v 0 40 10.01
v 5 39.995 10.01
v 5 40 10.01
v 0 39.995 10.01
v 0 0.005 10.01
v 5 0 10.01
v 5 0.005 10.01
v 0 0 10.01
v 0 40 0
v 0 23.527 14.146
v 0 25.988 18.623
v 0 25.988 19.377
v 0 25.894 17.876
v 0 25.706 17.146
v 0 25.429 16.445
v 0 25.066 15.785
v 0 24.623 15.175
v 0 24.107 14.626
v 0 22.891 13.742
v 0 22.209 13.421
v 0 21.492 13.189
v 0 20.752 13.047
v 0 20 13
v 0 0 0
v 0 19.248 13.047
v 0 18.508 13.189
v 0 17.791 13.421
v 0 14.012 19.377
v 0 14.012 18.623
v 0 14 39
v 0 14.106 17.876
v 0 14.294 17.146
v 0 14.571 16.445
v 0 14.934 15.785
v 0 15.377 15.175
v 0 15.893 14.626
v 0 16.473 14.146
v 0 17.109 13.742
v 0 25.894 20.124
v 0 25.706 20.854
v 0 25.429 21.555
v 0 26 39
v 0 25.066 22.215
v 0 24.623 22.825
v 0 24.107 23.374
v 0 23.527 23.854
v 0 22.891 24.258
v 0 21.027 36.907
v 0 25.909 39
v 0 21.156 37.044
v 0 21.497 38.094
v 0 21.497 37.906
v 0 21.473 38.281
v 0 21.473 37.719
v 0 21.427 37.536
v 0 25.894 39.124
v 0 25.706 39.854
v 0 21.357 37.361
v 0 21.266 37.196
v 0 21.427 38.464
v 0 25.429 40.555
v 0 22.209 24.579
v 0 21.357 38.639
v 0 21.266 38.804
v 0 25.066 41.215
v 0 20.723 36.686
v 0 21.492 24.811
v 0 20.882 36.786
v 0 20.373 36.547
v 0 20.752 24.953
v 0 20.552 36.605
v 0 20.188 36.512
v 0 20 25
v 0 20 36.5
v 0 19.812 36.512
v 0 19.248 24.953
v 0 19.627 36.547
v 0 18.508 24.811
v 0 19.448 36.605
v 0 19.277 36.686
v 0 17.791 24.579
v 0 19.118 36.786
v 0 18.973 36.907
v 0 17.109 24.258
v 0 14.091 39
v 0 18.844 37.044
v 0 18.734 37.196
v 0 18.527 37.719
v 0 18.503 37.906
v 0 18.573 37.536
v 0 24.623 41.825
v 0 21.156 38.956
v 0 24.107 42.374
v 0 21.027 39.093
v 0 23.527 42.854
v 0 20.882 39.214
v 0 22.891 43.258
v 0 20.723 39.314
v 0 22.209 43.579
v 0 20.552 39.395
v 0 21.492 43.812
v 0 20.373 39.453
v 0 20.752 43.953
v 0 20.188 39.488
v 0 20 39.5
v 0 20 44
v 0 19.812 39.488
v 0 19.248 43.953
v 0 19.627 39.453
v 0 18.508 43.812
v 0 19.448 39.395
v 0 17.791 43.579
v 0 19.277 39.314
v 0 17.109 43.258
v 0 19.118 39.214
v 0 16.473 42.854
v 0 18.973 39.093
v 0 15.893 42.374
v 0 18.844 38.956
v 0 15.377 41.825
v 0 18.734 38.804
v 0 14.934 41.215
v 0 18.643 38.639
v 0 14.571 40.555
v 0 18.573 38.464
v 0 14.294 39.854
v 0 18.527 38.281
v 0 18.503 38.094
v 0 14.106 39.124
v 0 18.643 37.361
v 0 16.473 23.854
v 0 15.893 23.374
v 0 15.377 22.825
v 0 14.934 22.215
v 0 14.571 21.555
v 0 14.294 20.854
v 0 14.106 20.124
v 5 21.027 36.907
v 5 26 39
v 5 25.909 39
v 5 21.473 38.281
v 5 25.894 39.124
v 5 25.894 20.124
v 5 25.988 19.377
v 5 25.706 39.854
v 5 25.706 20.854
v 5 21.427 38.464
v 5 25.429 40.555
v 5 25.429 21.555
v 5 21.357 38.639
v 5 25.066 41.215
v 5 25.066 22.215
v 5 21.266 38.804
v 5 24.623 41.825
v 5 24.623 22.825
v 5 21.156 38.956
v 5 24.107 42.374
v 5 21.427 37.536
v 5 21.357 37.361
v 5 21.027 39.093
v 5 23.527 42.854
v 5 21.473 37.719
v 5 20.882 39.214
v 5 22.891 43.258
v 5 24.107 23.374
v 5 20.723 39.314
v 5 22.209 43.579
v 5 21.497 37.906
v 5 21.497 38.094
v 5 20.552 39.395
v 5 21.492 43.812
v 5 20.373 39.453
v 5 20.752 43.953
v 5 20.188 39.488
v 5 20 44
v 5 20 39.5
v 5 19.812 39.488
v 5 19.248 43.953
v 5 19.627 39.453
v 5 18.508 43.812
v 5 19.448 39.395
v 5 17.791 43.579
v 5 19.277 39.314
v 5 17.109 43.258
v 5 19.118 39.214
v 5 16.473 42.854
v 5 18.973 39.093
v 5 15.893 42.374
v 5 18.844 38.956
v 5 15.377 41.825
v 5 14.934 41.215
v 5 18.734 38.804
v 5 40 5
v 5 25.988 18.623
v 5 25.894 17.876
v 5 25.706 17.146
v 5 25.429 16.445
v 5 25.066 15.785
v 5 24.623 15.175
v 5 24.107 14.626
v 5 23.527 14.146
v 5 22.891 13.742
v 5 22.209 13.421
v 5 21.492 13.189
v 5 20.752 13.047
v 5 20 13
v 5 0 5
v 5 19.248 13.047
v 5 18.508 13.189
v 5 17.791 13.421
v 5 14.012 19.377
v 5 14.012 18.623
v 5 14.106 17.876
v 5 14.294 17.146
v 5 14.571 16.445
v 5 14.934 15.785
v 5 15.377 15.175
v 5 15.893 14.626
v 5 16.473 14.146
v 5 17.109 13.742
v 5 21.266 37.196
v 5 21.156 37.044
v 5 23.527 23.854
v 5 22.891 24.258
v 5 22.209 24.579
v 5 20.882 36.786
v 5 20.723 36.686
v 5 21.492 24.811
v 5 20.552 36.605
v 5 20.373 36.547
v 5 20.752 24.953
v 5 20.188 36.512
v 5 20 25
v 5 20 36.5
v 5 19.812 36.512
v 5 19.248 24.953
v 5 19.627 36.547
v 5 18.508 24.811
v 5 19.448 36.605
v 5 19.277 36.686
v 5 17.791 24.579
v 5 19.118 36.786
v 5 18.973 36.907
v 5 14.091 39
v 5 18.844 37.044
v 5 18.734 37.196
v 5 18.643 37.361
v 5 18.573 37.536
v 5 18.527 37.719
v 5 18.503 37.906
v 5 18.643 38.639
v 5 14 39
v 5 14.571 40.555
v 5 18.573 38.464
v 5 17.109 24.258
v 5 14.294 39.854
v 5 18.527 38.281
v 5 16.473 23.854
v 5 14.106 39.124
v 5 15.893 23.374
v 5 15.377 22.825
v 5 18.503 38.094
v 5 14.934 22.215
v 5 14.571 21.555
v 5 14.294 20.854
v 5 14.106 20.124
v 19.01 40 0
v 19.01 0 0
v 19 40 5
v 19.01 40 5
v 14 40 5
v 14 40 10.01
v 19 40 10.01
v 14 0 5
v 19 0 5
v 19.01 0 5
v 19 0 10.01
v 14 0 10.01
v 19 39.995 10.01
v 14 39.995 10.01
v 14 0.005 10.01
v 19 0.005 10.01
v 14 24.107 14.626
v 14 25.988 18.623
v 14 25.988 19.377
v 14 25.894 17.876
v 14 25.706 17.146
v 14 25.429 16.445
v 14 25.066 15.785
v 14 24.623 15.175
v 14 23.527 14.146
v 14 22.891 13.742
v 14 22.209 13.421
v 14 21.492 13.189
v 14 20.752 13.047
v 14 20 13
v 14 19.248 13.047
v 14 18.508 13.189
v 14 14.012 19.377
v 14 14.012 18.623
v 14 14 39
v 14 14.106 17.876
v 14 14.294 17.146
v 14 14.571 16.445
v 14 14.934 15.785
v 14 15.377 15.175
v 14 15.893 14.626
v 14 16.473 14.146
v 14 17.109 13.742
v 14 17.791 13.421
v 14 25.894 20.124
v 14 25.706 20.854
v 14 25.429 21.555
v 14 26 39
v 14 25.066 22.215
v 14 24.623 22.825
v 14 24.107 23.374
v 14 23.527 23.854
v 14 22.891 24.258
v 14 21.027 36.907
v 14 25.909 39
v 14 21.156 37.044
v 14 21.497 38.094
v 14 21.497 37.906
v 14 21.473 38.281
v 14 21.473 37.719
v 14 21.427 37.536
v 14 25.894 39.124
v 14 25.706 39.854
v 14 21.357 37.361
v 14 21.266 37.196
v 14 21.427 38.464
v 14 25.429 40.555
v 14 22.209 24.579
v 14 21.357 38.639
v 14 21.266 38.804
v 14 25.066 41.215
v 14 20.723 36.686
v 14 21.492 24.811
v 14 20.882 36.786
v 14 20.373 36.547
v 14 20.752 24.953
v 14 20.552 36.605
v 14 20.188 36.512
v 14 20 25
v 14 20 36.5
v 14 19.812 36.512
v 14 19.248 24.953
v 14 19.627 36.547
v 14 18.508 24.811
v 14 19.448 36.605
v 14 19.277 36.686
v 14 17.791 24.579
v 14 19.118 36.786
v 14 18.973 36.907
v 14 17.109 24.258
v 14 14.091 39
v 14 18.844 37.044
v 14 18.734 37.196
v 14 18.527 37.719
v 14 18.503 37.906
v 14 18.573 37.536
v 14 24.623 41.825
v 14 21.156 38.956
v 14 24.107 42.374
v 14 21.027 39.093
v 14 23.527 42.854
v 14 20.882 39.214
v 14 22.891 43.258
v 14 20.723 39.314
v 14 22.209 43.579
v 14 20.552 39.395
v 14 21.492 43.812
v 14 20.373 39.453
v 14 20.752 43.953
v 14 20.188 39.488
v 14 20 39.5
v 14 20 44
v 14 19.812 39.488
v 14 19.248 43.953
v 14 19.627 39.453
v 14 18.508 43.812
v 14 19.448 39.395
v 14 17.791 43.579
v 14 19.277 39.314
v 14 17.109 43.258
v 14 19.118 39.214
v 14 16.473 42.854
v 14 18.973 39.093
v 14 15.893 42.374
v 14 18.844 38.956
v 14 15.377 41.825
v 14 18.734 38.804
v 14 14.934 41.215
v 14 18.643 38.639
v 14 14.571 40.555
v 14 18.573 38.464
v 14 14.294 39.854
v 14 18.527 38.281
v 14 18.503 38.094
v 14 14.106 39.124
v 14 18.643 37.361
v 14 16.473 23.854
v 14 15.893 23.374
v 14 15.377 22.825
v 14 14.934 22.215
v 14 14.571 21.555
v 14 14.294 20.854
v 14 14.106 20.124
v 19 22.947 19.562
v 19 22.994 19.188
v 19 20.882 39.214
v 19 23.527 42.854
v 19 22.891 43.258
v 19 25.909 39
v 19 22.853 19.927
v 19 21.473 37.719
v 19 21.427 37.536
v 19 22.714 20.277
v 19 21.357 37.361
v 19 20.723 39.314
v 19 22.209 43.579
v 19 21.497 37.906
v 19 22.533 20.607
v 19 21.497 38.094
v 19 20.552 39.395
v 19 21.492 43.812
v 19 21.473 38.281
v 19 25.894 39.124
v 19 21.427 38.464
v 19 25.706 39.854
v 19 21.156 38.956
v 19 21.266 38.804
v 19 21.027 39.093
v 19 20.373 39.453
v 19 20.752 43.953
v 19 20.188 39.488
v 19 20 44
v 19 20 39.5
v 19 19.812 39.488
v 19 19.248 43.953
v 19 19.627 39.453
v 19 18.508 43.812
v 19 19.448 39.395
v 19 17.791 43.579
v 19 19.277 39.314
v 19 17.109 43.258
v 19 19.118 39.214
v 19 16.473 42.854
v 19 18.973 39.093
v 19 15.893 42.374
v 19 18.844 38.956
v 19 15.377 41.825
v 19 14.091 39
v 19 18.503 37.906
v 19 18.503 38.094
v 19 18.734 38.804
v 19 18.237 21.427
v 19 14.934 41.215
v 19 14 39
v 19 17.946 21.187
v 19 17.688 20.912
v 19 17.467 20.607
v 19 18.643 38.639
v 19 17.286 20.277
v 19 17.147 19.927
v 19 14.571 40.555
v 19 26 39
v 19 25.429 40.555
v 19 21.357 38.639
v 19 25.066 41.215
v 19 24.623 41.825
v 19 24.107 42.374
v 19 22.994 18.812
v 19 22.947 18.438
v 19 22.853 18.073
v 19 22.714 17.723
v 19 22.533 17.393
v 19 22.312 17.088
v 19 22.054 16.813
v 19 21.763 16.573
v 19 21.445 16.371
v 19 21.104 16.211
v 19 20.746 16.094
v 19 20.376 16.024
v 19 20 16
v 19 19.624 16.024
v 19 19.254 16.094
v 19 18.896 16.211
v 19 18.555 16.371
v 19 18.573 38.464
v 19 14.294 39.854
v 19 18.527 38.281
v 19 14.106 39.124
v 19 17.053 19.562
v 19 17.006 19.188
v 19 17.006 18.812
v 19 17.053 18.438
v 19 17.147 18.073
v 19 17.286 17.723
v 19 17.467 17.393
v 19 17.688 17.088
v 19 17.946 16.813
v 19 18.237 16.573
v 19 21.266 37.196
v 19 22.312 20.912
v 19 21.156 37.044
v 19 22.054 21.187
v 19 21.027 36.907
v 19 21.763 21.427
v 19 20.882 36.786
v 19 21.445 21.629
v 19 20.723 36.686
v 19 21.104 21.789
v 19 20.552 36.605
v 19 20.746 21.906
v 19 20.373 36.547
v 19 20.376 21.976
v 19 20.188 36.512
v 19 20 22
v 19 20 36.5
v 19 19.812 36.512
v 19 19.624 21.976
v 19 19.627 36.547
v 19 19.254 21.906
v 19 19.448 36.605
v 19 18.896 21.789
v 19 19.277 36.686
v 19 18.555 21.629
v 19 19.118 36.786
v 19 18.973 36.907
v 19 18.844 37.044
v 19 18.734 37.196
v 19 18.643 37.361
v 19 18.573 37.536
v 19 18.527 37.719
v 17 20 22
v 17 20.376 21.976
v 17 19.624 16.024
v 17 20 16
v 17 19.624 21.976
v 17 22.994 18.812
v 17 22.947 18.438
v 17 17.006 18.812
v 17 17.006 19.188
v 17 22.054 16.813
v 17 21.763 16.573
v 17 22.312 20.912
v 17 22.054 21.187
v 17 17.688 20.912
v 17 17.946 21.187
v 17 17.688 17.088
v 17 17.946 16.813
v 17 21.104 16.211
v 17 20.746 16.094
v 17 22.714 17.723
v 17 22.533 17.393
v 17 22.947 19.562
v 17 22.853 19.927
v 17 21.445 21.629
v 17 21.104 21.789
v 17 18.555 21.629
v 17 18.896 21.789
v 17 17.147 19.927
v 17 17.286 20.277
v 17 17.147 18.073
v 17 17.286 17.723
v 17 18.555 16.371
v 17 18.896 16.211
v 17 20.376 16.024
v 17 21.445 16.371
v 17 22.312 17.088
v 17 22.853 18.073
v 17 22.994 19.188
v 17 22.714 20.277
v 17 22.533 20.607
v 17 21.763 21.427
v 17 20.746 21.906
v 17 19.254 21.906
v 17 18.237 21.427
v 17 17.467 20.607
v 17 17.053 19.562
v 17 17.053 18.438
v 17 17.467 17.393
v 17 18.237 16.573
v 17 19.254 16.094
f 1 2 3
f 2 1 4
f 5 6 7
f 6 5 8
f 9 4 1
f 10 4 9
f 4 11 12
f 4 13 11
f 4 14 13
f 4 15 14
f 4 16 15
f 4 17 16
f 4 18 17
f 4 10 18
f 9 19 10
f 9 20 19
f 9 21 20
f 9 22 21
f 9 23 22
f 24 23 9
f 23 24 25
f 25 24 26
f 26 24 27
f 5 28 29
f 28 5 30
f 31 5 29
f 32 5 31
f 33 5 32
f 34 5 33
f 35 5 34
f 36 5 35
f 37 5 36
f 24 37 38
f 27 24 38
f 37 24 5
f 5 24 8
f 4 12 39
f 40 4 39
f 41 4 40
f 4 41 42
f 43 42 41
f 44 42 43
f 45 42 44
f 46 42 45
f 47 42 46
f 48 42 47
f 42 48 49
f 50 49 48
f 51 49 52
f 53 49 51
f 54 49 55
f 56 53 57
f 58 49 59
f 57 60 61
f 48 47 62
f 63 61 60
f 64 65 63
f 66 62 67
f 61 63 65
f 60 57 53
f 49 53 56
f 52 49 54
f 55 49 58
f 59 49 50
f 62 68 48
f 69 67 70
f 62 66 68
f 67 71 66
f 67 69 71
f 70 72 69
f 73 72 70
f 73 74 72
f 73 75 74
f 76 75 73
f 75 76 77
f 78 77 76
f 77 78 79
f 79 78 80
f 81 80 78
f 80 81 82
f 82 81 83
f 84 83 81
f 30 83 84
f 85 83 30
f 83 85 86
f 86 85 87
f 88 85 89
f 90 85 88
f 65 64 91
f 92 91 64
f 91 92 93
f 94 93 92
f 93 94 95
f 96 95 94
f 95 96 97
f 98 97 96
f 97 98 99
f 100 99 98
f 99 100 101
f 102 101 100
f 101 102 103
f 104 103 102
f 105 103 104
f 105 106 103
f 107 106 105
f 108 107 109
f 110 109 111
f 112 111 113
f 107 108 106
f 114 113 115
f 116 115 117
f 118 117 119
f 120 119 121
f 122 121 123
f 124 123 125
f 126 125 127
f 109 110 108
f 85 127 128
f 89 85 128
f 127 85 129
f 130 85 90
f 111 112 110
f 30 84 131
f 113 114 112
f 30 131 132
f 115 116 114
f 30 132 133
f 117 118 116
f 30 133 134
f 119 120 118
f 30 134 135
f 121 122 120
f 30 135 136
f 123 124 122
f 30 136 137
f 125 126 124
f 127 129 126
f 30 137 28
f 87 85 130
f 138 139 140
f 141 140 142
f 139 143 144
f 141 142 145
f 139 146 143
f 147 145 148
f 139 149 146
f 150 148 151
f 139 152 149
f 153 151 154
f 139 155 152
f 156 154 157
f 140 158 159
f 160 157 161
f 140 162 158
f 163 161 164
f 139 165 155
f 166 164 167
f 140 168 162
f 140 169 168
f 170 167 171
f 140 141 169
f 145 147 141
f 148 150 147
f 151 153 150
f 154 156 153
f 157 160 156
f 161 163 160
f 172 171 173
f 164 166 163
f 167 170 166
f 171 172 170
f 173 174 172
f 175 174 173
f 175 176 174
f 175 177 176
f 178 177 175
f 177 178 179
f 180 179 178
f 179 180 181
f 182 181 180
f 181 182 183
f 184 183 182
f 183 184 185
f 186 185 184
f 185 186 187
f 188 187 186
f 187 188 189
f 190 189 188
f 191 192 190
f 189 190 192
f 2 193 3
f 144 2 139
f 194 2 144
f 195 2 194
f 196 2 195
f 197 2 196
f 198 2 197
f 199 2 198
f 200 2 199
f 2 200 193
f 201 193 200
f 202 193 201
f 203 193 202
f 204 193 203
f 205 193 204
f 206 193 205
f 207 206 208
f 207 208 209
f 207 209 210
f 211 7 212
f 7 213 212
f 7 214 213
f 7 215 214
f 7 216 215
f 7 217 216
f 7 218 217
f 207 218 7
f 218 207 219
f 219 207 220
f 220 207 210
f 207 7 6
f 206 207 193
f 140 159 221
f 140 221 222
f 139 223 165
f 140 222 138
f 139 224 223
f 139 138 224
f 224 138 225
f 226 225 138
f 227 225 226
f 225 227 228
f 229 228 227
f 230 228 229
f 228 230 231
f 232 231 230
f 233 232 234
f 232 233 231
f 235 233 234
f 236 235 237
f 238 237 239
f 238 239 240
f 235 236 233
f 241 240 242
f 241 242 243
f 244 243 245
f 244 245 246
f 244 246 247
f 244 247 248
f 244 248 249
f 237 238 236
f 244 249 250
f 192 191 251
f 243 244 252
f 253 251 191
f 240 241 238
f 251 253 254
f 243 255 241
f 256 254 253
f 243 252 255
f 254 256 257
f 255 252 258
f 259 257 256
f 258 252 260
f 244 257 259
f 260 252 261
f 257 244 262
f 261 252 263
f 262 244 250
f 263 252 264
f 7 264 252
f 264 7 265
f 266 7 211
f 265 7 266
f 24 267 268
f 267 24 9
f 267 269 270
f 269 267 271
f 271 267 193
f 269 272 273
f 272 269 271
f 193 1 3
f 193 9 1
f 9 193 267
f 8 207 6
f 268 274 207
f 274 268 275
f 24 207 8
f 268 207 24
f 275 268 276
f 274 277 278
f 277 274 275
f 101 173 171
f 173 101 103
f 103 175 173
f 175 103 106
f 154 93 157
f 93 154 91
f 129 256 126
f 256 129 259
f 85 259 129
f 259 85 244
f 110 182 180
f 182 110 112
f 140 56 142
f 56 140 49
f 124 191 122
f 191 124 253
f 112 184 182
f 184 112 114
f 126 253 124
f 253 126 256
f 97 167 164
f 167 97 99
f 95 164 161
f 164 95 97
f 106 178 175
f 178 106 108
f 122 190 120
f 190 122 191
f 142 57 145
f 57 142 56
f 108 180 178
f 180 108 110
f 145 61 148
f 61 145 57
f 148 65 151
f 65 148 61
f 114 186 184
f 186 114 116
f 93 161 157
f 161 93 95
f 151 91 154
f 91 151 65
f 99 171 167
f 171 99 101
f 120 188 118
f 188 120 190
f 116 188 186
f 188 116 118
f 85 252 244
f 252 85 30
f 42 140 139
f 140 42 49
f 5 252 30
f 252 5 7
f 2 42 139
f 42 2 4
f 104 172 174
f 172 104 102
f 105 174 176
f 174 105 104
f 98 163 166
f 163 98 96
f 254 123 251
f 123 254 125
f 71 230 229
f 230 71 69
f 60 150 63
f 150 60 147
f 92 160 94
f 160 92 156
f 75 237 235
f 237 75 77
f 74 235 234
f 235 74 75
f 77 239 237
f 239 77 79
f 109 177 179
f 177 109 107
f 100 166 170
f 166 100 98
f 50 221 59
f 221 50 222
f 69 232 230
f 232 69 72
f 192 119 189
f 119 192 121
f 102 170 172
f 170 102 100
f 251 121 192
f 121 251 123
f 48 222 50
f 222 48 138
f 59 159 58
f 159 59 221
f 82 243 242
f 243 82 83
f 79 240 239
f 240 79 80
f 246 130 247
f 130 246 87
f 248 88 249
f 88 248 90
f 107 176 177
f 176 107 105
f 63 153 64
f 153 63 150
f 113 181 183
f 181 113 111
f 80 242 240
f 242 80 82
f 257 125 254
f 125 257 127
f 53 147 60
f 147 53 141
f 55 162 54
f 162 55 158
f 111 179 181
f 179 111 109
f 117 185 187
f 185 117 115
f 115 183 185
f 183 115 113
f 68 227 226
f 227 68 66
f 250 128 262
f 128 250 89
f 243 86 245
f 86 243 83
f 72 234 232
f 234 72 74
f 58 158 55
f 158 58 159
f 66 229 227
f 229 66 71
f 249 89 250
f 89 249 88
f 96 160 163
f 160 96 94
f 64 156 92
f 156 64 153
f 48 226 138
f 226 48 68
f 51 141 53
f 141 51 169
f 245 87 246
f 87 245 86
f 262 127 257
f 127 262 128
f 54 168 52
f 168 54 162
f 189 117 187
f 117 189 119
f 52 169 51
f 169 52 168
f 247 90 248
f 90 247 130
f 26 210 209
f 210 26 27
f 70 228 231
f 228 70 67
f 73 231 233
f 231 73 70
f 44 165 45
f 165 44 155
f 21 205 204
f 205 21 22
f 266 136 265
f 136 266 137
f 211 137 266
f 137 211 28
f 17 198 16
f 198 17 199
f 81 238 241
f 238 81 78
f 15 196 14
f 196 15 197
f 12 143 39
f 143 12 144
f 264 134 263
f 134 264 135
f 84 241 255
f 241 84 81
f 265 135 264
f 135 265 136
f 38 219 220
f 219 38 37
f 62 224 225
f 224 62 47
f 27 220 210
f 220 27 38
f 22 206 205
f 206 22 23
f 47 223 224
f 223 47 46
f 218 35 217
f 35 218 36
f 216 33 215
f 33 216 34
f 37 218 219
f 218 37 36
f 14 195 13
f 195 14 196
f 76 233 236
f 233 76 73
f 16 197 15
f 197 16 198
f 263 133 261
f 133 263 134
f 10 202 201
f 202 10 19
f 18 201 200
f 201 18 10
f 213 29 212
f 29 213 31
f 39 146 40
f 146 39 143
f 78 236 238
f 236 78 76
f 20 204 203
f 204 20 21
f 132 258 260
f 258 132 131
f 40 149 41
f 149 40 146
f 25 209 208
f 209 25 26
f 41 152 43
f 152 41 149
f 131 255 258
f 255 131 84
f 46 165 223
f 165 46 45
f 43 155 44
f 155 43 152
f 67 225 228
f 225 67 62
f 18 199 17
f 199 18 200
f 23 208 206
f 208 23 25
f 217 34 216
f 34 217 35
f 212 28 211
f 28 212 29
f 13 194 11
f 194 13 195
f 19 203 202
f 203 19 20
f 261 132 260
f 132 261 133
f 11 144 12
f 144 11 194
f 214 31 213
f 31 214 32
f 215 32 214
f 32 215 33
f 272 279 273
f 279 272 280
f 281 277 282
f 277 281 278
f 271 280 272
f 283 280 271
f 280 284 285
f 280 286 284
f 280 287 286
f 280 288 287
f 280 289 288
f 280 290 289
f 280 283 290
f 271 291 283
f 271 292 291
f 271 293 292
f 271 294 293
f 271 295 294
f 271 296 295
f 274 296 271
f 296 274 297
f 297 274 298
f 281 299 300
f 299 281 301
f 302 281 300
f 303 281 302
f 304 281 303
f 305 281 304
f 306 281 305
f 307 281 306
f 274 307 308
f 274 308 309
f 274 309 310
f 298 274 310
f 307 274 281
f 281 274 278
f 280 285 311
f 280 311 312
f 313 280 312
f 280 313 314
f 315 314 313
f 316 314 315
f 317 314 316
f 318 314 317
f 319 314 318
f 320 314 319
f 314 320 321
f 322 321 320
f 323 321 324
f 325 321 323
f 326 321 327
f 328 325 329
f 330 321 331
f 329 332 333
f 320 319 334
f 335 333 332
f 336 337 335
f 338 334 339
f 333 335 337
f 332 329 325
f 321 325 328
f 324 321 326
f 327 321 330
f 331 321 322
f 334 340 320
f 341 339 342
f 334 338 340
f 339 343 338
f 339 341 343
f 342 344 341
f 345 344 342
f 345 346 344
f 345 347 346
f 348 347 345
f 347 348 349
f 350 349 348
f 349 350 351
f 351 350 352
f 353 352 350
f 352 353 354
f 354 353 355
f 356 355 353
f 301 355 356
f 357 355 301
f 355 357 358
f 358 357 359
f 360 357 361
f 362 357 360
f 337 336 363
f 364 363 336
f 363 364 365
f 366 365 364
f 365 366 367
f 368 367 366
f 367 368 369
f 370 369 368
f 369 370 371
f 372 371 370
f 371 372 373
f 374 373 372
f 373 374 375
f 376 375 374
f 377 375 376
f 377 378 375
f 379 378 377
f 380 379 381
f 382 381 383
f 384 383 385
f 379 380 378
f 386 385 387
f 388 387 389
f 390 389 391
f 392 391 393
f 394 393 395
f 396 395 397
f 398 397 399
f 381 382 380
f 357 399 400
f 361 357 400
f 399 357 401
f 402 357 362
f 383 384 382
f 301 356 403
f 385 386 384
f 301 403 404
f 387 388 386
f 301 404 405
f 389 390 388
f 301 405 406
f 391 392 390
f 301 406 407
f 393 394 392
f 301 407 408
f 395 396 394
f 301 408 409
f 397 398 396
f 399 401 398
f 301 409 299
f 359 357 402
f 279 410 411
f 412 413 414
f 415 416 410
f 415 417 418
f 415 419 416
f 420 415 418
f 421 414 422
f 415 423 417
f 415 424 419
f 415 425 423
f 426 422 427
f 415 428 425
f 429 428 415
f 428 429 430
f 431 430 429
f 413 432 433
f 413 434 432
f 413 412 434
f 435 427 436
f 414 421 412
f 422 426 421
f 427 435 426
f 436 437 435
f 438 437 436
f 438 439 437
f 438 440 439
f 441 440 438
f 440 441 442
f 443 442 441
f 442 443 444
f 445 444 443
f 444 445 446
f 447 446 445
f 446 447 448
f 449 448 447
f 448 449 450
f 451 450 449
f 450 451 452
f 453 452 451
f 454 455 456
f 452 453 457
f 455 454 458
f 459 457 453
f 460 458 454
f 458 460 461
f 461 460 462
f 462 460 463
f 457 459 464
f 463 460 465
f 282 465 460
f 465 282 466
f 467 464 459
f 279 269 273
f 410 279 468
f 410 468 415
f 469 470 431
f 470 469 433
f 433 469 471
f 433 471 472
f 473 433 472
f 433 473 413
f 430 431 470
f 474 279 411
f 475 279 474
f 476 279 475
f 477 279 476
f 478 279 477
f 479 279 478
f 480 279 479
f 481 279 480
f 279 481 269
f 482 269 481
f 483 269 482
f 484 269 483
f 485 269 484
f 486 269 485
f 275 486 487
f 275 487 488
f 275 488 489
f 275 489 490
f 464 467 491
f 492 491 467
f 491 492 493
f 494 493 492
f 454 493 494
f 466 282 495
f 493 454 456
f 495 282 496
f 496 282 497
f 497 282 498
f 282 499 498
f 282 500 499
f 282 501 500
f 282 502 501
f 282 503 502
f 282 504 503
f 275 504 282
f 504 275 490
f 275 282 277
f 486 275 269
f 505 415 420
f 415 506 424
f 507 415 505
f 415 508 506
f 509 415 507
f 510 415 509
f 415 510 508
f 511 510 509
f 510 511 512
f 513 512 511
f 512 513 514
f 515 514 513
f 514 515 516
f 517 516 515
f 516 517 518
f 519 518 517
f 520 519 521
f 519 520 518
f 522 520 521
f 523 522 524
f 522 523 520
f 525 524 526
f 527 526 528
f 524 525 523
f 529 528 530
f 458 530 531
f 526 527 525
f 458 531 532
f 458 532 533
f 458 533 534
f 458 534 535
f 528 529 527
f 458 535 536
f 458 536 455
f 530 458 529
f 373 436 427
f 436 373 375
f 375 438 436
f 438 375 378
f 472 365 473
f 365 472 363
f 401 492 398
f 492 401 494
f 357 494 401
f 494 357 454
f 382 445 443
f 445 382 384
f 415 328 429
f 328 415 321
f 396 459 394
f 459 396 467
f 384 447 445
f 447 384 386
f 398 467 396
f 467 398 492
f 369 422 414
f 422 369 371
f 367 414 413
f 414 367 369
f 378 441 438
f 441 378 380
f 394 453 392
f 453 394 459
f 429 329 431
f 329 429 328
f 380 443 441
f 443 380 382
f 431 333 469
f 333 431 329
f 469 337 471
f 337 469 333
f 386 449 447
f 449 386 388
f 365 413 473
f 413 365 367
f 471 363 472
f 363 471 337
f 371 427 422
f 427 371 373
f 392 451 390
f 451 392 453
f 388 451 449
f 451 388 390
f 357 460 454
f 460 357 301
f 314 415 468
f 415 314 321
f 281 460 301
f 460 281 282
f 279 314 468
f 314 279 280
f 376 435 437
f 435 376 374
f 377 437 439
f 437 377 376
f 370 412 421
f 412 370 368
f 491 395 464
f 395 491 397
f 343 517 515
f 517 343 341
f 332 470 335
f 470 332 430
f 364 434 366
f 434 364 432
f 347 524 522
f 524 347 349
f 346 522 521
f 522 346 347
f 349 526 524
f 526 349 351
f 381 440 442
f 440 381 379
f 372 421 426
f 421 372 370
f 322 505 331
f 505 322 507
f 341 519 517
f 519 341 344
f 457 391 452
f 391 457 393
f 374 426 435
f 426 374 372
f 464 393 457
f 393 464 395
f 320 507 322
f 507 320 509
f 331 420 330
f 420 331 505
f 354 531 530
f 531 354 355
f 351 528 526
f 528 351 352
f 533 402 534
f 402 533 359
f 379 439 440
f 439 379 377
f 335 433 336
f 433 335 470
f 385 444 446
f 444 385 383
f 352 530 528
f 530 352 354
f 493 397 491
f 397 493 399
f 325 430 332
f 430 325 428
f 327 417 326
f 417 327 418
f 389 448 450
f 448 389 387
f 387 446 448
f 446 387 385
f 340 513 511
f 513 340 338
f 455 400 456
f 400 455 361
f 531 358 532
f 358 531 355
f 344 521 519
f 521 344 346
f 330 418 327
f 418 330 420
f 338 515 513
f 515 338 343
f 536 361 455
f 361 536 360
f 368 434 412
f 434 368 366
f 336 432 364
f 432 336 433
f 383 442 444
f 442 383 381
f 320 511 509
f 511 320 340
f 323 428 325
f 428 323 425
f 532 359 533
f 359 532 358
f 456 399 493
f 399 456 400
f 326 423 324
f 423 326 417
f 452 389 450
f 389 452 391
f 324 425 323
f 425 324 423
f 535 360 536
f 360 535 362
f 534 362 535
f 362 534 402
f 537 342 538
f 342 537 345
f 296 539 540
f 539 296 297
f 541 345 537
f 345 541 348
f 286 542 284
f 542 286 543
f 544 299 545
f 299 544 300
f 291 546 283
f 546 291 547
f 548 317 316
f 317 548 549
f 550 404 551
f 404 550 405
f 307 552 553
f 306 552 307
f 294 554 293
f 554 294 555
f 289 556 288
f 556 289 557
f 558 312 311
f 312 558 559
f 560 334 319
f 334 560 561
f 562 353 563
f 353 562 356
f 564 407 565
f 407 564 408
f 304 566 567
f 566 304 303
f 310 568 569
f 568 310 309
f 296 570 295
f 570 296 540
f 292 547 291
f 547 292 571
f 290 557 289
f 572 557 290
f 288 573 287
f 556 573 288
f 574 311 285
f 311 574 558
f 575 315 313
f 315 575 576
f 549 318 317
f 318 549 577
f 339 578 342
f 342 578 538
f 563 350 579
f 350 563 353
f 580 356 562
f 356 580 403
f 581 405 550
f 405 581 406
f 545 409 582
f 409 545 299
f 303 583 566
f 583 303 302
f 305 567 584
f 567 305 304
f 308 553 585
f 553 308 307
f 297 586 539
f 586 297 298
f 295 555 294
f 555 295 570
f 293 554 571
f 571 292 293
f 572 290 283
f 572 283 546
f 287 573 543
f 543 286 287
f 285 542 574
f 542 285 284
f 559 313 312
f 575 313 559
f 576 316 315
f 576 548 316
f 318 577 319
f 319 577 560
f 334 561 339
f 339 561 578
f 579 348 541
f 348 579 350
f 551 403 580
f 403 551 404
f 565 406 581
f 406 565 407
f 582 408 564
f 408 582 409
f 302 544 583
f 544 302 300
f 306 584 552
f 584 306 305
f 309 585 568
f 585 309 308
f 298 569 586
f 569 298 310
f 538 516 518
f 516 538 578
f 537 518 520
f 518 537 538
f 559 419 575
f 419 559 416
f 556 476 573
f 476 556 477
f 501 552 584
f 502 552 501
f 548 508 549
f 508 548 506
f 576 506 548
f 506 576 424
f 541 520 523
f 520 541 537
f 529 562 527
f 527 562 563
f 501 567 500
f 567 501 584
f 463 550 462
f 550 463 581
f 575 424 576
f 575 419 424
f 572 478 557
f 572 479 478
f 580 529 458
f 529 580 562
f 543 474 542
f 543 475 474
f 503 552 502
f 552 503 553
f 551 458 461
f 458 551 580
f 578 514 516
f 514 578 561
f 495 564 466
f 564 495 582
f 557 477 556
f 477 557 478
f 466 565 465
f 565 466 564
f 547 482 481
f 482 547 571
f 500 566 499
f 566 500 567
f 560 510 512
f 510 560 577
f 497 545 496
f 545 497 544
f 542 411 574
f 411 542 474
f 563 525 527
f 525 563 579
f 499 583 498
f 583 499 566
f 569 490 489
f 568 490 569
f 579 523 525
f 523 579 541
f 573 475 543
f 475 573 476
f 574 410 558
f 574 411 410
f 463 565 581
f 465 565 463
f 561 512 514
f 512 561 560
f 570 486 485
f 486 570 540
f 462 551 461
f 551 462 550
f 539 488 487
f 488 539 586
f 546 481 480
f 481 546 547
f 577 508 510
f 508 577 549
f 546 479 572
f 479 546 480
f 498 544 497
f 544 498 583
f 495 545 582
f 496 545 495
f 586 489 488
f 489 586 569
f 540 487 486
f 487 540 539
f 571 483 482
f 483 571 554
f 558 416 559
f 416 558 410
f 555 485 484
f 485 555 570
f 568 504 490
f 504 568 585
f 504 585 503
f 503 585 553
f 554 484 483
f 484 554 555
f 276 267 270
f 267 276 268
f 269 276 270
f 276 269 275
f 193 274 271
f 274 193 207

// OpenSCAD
$fn=50;

hc=5;
cil=34;
cil2=12;
le=40;
br=19;
br2=10;

union()
{    
    
    translate([0,0,0])
        cube([br+0.01,le,hc], center=false);

    translate([5,0,0])
    rotate([0,-90,0])
        difference()
        {    
            union()
            {
                translate([0,0,0])
                    cube([br2+0.01,le,hc], center=false);

                translate([38,le/2,2.5])
                    cylinder(h=hc,d=cil2,center=true);
                
                CubePoints = [
                  [br2,0,0 ],  //0
                  [39,(le-cil2)/2,0 ],  //1
                  [39,cil2+(le-cil2)/2,0 ],  //2
                  [br2,le,0 ],  //3
                  [br2,0,hc ],  //4
                  [39,(le-cil2)/2,hc ],  //5
                  [39,cil2+(le-cil2)/2,hc ],  //6
                  [br2,le,hc ]]; //7
                  
                CubeFaces = [
                  [0,1,2,3],  // bottom
                  [4,5,1,0],  // front
                  [7,6,5,4],  // top
                  [5,6,2,1],  // right
                  [6,7,3,2],  // back
                  [7,4,0,3]]; // left
                  
                polyhedron( CubePoints, CubeFaces );
            
            };      

            translate([38,le/2,2.5])
                cylinder(h=hc+1,d=3,center=true);
            translate([19,le/2,3])
                cylinder(h=6,d=12,center=true);
        };
        
    translate([19,0,0])
    rotate([0,-90,0])
        difference()
        {    
            union()
            {
                translate([0,0,0])
                    cube([br2+0.01,le,hc], center=false);

                translate([38,le/2,2.5])
                    cylinder(h=hc,d=cil2,center=true);
                
                CubePoints = [
                  [br2,0,0 ],  //0
                  [39,(le-cil2)/2,0 ],  //1
                  [39,cil2+(le-cil2)/2,0 ],  //2
                  [br2,le,0 ],  //3
                  [br2,0,hc ],  //4
                  [39,(le-cil2)/2,hc ],  //5
                  [39,cil2+(le-cil2)/2,hc ],  //6
                  [br2,le,hc ]]; //7
                  
                CubeFaces = [
                  [0,1,2,3],  // bottom
                  [4,5,1,0],  // front
                  [7,6,5,4],  // top
                  [5,6,2,1],  // right
                  [6,7,3,2],  // back
                  [7,4,0,3]]; // left
                  
                polyhedron( CubePoints, CubeFaces );
            
            };      

            translate([38,le/2,2.5])
                cylinder(h=hc+1,d=3,center=true);
            
            translate([19,le/2,2])
                cylinder(h=6,d1=0,d2=12,center=true);
            translate([19,le/2,2])
                cylinder(h=6,d=6,center=true);
            
        };
    }
